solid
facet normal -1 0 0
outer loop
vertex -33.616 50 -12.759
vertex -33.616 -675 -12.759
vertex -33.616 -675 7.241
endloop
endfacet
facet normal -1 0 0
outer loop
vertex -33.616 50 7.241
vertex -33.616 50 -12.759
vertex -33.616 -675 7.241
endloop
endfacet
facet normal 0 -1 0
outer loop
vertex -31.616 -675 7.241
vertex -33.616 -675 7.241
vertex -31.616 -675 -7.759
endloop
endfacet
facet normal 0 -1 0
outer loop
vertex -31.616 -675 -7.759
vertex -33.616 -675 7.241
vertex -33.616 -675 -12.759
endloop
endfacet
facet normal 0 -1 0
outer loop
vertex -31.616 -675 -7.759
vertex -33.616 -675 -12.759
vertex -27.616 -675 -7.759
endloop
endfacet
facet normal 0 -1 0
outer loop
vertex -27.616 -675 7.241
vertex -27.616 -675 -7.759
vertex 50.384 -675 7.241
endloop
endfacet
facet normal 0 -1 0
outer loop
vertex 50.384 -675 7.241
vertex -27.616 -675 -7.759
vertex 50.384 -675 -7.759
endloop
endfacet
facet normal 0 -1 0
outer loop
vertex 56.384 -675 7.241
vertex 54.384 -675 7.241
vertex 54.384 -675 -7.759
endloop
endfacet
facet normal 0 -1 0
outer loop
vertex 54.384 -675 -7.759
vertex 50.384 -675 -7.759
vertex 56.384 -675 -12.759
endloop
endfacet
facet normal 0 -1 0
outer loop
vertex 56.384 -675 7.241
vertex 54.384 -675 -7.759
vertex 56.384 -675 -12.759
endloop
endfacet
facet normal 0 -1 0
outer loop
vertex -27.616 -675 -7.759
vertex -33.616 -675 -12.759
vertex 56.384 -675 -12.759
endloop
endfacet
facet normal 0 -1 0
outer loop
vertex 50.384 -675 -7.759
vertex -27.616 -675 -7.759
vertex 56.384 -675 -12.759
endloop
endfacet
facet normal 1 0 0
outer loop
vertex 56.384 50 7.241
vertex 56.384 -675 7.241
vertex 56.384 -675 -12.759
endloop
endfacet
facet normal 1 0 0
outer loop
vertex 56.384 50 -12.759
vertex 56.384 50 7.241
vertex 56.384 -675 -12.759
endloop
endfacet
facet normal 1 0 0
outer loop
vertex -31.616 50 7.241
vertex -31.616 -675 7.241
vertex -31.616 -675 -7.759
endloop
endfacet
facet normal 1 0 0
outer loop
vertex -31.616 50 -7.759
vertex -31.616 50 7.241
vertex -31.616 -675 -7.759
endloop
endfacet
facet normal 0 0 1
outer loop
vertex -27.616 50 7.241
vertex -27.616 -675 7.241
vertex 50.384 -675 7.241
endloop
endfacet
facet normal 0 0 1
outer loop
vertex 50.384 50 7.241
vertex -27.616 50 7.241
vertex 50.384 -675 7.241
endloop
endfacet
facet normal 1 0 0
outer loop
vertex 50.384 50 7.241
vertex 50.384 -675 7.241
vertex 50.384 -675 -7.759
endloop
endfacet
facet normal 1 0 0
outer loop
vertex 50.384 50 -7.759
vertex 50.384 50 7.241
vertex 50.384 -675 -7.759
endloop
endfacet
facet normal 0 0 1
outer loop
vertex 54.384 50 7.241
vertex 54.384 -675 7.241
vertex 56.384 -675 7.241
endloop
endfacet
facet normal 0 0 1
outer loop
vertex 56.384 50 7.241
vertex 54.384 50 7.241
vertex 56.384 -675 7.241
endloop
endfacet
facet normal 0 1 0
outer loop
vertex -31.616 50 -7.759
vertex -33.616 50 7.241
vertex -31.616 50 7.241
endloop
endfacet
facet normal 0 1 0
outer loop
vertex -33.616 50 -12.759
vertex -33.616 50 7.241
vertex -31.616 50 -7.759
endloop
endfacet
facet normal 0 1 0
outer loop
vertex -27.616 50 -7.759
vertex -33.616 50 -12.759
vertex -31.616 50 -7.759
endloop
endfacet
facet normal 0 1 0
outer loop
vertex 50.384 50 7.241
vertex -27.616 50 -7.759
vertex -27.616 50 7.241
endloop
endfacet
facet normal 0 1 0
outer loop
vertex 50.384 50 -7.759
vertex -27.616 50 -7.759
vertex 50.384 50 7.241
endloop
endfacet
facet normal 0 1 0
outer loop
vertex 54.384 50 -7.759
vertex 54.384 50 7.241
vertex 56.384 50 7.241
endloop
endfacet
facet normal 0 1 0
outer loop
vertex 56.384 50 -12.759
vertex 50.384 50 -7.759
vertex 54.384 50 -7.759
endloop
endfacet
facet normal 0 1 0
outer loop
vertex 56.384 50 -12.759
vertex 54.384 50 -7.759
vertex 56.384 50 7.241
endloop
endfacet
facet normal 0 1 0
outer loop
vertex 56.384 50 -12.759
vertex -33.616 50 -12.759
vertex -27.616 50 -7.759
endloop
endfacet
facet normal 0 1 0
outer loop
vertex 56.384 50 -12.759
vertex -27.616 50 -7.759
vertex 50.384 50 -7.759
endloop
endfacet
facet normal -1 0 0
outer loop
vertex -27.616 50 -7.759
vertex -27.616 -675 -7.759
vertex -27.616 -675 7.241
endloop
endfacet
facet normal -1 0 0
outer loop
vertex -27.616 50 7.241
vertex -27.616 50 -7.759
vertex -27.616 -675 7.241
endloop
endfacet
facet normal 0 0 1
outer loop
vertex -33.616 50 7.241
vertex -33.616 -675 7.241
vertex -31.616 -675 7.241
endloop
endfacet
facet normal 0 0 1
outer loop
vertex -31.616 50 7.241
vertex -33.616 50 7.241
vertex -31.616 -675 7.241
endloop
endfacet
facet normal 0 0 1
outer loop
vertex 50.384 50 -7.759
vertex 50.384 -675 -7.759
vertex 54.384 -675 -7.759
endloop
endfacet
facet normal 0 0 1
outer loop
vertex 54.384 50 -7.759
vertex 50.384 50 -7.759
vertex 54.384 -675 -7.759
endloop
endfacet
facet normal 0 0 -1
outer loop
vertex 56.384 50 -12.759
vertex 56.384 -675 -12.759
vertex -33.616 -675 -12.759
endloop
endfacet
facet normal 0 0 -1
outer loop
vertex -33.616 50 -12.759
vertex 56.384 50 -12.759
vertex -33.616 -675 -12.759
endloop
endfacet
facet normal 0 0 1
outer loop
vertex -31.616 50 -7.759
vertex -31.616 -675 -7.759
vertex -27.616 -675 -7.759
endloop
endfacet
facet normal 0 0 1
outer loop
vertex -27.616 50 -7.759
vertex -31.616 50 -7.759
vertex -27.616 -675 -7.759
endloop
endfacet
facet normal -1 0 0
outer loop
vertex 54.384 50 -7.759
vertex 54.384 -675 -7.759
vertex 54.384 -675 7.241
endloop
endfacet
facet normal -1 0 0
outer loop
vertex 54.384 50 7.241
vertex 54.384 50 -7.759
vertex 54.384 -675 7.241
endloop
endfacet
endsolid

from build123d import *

# Parameters (mm, degrees)
EXTRUDE_1_DEPTH      = 50
EXTRUDE_1_DEPTH_BACK = 675


with BuildPart() as part:
    # Эскиз1 → Бобышка-Вытянуть1 (new, two sides: drawn at the far end of the back side and taken through both)
    with BuildSketch(Plane(origin=(0, 0, 0), x_dir=(1, 0, 0), z_dir=(0, 1, 0)).offset(-EXTRUDE_1_DEPTH_BACK)):
        Polygon((-31.616298812, -7.241086587), (-31.616298812, 7.758913413), (-27.616298812, 7.758913413), (-27.616298812, -7.241086587), (50.383701188, -7.241086587), (50.383701188, 7.758913413), (54.383701188, 7.758913413), (54.383701188, -7.241086587), (56.383701188, -7.241086587), (56.383701188, 12.758913413), (-33.616298812, 12.758913413), (-33.616298812, -7.241086587), align=None)
    extrude(amount=EXTRUDE_1_DEPTH + EXTRUDE_1_DEPTH_BACK)


solid = part.part
